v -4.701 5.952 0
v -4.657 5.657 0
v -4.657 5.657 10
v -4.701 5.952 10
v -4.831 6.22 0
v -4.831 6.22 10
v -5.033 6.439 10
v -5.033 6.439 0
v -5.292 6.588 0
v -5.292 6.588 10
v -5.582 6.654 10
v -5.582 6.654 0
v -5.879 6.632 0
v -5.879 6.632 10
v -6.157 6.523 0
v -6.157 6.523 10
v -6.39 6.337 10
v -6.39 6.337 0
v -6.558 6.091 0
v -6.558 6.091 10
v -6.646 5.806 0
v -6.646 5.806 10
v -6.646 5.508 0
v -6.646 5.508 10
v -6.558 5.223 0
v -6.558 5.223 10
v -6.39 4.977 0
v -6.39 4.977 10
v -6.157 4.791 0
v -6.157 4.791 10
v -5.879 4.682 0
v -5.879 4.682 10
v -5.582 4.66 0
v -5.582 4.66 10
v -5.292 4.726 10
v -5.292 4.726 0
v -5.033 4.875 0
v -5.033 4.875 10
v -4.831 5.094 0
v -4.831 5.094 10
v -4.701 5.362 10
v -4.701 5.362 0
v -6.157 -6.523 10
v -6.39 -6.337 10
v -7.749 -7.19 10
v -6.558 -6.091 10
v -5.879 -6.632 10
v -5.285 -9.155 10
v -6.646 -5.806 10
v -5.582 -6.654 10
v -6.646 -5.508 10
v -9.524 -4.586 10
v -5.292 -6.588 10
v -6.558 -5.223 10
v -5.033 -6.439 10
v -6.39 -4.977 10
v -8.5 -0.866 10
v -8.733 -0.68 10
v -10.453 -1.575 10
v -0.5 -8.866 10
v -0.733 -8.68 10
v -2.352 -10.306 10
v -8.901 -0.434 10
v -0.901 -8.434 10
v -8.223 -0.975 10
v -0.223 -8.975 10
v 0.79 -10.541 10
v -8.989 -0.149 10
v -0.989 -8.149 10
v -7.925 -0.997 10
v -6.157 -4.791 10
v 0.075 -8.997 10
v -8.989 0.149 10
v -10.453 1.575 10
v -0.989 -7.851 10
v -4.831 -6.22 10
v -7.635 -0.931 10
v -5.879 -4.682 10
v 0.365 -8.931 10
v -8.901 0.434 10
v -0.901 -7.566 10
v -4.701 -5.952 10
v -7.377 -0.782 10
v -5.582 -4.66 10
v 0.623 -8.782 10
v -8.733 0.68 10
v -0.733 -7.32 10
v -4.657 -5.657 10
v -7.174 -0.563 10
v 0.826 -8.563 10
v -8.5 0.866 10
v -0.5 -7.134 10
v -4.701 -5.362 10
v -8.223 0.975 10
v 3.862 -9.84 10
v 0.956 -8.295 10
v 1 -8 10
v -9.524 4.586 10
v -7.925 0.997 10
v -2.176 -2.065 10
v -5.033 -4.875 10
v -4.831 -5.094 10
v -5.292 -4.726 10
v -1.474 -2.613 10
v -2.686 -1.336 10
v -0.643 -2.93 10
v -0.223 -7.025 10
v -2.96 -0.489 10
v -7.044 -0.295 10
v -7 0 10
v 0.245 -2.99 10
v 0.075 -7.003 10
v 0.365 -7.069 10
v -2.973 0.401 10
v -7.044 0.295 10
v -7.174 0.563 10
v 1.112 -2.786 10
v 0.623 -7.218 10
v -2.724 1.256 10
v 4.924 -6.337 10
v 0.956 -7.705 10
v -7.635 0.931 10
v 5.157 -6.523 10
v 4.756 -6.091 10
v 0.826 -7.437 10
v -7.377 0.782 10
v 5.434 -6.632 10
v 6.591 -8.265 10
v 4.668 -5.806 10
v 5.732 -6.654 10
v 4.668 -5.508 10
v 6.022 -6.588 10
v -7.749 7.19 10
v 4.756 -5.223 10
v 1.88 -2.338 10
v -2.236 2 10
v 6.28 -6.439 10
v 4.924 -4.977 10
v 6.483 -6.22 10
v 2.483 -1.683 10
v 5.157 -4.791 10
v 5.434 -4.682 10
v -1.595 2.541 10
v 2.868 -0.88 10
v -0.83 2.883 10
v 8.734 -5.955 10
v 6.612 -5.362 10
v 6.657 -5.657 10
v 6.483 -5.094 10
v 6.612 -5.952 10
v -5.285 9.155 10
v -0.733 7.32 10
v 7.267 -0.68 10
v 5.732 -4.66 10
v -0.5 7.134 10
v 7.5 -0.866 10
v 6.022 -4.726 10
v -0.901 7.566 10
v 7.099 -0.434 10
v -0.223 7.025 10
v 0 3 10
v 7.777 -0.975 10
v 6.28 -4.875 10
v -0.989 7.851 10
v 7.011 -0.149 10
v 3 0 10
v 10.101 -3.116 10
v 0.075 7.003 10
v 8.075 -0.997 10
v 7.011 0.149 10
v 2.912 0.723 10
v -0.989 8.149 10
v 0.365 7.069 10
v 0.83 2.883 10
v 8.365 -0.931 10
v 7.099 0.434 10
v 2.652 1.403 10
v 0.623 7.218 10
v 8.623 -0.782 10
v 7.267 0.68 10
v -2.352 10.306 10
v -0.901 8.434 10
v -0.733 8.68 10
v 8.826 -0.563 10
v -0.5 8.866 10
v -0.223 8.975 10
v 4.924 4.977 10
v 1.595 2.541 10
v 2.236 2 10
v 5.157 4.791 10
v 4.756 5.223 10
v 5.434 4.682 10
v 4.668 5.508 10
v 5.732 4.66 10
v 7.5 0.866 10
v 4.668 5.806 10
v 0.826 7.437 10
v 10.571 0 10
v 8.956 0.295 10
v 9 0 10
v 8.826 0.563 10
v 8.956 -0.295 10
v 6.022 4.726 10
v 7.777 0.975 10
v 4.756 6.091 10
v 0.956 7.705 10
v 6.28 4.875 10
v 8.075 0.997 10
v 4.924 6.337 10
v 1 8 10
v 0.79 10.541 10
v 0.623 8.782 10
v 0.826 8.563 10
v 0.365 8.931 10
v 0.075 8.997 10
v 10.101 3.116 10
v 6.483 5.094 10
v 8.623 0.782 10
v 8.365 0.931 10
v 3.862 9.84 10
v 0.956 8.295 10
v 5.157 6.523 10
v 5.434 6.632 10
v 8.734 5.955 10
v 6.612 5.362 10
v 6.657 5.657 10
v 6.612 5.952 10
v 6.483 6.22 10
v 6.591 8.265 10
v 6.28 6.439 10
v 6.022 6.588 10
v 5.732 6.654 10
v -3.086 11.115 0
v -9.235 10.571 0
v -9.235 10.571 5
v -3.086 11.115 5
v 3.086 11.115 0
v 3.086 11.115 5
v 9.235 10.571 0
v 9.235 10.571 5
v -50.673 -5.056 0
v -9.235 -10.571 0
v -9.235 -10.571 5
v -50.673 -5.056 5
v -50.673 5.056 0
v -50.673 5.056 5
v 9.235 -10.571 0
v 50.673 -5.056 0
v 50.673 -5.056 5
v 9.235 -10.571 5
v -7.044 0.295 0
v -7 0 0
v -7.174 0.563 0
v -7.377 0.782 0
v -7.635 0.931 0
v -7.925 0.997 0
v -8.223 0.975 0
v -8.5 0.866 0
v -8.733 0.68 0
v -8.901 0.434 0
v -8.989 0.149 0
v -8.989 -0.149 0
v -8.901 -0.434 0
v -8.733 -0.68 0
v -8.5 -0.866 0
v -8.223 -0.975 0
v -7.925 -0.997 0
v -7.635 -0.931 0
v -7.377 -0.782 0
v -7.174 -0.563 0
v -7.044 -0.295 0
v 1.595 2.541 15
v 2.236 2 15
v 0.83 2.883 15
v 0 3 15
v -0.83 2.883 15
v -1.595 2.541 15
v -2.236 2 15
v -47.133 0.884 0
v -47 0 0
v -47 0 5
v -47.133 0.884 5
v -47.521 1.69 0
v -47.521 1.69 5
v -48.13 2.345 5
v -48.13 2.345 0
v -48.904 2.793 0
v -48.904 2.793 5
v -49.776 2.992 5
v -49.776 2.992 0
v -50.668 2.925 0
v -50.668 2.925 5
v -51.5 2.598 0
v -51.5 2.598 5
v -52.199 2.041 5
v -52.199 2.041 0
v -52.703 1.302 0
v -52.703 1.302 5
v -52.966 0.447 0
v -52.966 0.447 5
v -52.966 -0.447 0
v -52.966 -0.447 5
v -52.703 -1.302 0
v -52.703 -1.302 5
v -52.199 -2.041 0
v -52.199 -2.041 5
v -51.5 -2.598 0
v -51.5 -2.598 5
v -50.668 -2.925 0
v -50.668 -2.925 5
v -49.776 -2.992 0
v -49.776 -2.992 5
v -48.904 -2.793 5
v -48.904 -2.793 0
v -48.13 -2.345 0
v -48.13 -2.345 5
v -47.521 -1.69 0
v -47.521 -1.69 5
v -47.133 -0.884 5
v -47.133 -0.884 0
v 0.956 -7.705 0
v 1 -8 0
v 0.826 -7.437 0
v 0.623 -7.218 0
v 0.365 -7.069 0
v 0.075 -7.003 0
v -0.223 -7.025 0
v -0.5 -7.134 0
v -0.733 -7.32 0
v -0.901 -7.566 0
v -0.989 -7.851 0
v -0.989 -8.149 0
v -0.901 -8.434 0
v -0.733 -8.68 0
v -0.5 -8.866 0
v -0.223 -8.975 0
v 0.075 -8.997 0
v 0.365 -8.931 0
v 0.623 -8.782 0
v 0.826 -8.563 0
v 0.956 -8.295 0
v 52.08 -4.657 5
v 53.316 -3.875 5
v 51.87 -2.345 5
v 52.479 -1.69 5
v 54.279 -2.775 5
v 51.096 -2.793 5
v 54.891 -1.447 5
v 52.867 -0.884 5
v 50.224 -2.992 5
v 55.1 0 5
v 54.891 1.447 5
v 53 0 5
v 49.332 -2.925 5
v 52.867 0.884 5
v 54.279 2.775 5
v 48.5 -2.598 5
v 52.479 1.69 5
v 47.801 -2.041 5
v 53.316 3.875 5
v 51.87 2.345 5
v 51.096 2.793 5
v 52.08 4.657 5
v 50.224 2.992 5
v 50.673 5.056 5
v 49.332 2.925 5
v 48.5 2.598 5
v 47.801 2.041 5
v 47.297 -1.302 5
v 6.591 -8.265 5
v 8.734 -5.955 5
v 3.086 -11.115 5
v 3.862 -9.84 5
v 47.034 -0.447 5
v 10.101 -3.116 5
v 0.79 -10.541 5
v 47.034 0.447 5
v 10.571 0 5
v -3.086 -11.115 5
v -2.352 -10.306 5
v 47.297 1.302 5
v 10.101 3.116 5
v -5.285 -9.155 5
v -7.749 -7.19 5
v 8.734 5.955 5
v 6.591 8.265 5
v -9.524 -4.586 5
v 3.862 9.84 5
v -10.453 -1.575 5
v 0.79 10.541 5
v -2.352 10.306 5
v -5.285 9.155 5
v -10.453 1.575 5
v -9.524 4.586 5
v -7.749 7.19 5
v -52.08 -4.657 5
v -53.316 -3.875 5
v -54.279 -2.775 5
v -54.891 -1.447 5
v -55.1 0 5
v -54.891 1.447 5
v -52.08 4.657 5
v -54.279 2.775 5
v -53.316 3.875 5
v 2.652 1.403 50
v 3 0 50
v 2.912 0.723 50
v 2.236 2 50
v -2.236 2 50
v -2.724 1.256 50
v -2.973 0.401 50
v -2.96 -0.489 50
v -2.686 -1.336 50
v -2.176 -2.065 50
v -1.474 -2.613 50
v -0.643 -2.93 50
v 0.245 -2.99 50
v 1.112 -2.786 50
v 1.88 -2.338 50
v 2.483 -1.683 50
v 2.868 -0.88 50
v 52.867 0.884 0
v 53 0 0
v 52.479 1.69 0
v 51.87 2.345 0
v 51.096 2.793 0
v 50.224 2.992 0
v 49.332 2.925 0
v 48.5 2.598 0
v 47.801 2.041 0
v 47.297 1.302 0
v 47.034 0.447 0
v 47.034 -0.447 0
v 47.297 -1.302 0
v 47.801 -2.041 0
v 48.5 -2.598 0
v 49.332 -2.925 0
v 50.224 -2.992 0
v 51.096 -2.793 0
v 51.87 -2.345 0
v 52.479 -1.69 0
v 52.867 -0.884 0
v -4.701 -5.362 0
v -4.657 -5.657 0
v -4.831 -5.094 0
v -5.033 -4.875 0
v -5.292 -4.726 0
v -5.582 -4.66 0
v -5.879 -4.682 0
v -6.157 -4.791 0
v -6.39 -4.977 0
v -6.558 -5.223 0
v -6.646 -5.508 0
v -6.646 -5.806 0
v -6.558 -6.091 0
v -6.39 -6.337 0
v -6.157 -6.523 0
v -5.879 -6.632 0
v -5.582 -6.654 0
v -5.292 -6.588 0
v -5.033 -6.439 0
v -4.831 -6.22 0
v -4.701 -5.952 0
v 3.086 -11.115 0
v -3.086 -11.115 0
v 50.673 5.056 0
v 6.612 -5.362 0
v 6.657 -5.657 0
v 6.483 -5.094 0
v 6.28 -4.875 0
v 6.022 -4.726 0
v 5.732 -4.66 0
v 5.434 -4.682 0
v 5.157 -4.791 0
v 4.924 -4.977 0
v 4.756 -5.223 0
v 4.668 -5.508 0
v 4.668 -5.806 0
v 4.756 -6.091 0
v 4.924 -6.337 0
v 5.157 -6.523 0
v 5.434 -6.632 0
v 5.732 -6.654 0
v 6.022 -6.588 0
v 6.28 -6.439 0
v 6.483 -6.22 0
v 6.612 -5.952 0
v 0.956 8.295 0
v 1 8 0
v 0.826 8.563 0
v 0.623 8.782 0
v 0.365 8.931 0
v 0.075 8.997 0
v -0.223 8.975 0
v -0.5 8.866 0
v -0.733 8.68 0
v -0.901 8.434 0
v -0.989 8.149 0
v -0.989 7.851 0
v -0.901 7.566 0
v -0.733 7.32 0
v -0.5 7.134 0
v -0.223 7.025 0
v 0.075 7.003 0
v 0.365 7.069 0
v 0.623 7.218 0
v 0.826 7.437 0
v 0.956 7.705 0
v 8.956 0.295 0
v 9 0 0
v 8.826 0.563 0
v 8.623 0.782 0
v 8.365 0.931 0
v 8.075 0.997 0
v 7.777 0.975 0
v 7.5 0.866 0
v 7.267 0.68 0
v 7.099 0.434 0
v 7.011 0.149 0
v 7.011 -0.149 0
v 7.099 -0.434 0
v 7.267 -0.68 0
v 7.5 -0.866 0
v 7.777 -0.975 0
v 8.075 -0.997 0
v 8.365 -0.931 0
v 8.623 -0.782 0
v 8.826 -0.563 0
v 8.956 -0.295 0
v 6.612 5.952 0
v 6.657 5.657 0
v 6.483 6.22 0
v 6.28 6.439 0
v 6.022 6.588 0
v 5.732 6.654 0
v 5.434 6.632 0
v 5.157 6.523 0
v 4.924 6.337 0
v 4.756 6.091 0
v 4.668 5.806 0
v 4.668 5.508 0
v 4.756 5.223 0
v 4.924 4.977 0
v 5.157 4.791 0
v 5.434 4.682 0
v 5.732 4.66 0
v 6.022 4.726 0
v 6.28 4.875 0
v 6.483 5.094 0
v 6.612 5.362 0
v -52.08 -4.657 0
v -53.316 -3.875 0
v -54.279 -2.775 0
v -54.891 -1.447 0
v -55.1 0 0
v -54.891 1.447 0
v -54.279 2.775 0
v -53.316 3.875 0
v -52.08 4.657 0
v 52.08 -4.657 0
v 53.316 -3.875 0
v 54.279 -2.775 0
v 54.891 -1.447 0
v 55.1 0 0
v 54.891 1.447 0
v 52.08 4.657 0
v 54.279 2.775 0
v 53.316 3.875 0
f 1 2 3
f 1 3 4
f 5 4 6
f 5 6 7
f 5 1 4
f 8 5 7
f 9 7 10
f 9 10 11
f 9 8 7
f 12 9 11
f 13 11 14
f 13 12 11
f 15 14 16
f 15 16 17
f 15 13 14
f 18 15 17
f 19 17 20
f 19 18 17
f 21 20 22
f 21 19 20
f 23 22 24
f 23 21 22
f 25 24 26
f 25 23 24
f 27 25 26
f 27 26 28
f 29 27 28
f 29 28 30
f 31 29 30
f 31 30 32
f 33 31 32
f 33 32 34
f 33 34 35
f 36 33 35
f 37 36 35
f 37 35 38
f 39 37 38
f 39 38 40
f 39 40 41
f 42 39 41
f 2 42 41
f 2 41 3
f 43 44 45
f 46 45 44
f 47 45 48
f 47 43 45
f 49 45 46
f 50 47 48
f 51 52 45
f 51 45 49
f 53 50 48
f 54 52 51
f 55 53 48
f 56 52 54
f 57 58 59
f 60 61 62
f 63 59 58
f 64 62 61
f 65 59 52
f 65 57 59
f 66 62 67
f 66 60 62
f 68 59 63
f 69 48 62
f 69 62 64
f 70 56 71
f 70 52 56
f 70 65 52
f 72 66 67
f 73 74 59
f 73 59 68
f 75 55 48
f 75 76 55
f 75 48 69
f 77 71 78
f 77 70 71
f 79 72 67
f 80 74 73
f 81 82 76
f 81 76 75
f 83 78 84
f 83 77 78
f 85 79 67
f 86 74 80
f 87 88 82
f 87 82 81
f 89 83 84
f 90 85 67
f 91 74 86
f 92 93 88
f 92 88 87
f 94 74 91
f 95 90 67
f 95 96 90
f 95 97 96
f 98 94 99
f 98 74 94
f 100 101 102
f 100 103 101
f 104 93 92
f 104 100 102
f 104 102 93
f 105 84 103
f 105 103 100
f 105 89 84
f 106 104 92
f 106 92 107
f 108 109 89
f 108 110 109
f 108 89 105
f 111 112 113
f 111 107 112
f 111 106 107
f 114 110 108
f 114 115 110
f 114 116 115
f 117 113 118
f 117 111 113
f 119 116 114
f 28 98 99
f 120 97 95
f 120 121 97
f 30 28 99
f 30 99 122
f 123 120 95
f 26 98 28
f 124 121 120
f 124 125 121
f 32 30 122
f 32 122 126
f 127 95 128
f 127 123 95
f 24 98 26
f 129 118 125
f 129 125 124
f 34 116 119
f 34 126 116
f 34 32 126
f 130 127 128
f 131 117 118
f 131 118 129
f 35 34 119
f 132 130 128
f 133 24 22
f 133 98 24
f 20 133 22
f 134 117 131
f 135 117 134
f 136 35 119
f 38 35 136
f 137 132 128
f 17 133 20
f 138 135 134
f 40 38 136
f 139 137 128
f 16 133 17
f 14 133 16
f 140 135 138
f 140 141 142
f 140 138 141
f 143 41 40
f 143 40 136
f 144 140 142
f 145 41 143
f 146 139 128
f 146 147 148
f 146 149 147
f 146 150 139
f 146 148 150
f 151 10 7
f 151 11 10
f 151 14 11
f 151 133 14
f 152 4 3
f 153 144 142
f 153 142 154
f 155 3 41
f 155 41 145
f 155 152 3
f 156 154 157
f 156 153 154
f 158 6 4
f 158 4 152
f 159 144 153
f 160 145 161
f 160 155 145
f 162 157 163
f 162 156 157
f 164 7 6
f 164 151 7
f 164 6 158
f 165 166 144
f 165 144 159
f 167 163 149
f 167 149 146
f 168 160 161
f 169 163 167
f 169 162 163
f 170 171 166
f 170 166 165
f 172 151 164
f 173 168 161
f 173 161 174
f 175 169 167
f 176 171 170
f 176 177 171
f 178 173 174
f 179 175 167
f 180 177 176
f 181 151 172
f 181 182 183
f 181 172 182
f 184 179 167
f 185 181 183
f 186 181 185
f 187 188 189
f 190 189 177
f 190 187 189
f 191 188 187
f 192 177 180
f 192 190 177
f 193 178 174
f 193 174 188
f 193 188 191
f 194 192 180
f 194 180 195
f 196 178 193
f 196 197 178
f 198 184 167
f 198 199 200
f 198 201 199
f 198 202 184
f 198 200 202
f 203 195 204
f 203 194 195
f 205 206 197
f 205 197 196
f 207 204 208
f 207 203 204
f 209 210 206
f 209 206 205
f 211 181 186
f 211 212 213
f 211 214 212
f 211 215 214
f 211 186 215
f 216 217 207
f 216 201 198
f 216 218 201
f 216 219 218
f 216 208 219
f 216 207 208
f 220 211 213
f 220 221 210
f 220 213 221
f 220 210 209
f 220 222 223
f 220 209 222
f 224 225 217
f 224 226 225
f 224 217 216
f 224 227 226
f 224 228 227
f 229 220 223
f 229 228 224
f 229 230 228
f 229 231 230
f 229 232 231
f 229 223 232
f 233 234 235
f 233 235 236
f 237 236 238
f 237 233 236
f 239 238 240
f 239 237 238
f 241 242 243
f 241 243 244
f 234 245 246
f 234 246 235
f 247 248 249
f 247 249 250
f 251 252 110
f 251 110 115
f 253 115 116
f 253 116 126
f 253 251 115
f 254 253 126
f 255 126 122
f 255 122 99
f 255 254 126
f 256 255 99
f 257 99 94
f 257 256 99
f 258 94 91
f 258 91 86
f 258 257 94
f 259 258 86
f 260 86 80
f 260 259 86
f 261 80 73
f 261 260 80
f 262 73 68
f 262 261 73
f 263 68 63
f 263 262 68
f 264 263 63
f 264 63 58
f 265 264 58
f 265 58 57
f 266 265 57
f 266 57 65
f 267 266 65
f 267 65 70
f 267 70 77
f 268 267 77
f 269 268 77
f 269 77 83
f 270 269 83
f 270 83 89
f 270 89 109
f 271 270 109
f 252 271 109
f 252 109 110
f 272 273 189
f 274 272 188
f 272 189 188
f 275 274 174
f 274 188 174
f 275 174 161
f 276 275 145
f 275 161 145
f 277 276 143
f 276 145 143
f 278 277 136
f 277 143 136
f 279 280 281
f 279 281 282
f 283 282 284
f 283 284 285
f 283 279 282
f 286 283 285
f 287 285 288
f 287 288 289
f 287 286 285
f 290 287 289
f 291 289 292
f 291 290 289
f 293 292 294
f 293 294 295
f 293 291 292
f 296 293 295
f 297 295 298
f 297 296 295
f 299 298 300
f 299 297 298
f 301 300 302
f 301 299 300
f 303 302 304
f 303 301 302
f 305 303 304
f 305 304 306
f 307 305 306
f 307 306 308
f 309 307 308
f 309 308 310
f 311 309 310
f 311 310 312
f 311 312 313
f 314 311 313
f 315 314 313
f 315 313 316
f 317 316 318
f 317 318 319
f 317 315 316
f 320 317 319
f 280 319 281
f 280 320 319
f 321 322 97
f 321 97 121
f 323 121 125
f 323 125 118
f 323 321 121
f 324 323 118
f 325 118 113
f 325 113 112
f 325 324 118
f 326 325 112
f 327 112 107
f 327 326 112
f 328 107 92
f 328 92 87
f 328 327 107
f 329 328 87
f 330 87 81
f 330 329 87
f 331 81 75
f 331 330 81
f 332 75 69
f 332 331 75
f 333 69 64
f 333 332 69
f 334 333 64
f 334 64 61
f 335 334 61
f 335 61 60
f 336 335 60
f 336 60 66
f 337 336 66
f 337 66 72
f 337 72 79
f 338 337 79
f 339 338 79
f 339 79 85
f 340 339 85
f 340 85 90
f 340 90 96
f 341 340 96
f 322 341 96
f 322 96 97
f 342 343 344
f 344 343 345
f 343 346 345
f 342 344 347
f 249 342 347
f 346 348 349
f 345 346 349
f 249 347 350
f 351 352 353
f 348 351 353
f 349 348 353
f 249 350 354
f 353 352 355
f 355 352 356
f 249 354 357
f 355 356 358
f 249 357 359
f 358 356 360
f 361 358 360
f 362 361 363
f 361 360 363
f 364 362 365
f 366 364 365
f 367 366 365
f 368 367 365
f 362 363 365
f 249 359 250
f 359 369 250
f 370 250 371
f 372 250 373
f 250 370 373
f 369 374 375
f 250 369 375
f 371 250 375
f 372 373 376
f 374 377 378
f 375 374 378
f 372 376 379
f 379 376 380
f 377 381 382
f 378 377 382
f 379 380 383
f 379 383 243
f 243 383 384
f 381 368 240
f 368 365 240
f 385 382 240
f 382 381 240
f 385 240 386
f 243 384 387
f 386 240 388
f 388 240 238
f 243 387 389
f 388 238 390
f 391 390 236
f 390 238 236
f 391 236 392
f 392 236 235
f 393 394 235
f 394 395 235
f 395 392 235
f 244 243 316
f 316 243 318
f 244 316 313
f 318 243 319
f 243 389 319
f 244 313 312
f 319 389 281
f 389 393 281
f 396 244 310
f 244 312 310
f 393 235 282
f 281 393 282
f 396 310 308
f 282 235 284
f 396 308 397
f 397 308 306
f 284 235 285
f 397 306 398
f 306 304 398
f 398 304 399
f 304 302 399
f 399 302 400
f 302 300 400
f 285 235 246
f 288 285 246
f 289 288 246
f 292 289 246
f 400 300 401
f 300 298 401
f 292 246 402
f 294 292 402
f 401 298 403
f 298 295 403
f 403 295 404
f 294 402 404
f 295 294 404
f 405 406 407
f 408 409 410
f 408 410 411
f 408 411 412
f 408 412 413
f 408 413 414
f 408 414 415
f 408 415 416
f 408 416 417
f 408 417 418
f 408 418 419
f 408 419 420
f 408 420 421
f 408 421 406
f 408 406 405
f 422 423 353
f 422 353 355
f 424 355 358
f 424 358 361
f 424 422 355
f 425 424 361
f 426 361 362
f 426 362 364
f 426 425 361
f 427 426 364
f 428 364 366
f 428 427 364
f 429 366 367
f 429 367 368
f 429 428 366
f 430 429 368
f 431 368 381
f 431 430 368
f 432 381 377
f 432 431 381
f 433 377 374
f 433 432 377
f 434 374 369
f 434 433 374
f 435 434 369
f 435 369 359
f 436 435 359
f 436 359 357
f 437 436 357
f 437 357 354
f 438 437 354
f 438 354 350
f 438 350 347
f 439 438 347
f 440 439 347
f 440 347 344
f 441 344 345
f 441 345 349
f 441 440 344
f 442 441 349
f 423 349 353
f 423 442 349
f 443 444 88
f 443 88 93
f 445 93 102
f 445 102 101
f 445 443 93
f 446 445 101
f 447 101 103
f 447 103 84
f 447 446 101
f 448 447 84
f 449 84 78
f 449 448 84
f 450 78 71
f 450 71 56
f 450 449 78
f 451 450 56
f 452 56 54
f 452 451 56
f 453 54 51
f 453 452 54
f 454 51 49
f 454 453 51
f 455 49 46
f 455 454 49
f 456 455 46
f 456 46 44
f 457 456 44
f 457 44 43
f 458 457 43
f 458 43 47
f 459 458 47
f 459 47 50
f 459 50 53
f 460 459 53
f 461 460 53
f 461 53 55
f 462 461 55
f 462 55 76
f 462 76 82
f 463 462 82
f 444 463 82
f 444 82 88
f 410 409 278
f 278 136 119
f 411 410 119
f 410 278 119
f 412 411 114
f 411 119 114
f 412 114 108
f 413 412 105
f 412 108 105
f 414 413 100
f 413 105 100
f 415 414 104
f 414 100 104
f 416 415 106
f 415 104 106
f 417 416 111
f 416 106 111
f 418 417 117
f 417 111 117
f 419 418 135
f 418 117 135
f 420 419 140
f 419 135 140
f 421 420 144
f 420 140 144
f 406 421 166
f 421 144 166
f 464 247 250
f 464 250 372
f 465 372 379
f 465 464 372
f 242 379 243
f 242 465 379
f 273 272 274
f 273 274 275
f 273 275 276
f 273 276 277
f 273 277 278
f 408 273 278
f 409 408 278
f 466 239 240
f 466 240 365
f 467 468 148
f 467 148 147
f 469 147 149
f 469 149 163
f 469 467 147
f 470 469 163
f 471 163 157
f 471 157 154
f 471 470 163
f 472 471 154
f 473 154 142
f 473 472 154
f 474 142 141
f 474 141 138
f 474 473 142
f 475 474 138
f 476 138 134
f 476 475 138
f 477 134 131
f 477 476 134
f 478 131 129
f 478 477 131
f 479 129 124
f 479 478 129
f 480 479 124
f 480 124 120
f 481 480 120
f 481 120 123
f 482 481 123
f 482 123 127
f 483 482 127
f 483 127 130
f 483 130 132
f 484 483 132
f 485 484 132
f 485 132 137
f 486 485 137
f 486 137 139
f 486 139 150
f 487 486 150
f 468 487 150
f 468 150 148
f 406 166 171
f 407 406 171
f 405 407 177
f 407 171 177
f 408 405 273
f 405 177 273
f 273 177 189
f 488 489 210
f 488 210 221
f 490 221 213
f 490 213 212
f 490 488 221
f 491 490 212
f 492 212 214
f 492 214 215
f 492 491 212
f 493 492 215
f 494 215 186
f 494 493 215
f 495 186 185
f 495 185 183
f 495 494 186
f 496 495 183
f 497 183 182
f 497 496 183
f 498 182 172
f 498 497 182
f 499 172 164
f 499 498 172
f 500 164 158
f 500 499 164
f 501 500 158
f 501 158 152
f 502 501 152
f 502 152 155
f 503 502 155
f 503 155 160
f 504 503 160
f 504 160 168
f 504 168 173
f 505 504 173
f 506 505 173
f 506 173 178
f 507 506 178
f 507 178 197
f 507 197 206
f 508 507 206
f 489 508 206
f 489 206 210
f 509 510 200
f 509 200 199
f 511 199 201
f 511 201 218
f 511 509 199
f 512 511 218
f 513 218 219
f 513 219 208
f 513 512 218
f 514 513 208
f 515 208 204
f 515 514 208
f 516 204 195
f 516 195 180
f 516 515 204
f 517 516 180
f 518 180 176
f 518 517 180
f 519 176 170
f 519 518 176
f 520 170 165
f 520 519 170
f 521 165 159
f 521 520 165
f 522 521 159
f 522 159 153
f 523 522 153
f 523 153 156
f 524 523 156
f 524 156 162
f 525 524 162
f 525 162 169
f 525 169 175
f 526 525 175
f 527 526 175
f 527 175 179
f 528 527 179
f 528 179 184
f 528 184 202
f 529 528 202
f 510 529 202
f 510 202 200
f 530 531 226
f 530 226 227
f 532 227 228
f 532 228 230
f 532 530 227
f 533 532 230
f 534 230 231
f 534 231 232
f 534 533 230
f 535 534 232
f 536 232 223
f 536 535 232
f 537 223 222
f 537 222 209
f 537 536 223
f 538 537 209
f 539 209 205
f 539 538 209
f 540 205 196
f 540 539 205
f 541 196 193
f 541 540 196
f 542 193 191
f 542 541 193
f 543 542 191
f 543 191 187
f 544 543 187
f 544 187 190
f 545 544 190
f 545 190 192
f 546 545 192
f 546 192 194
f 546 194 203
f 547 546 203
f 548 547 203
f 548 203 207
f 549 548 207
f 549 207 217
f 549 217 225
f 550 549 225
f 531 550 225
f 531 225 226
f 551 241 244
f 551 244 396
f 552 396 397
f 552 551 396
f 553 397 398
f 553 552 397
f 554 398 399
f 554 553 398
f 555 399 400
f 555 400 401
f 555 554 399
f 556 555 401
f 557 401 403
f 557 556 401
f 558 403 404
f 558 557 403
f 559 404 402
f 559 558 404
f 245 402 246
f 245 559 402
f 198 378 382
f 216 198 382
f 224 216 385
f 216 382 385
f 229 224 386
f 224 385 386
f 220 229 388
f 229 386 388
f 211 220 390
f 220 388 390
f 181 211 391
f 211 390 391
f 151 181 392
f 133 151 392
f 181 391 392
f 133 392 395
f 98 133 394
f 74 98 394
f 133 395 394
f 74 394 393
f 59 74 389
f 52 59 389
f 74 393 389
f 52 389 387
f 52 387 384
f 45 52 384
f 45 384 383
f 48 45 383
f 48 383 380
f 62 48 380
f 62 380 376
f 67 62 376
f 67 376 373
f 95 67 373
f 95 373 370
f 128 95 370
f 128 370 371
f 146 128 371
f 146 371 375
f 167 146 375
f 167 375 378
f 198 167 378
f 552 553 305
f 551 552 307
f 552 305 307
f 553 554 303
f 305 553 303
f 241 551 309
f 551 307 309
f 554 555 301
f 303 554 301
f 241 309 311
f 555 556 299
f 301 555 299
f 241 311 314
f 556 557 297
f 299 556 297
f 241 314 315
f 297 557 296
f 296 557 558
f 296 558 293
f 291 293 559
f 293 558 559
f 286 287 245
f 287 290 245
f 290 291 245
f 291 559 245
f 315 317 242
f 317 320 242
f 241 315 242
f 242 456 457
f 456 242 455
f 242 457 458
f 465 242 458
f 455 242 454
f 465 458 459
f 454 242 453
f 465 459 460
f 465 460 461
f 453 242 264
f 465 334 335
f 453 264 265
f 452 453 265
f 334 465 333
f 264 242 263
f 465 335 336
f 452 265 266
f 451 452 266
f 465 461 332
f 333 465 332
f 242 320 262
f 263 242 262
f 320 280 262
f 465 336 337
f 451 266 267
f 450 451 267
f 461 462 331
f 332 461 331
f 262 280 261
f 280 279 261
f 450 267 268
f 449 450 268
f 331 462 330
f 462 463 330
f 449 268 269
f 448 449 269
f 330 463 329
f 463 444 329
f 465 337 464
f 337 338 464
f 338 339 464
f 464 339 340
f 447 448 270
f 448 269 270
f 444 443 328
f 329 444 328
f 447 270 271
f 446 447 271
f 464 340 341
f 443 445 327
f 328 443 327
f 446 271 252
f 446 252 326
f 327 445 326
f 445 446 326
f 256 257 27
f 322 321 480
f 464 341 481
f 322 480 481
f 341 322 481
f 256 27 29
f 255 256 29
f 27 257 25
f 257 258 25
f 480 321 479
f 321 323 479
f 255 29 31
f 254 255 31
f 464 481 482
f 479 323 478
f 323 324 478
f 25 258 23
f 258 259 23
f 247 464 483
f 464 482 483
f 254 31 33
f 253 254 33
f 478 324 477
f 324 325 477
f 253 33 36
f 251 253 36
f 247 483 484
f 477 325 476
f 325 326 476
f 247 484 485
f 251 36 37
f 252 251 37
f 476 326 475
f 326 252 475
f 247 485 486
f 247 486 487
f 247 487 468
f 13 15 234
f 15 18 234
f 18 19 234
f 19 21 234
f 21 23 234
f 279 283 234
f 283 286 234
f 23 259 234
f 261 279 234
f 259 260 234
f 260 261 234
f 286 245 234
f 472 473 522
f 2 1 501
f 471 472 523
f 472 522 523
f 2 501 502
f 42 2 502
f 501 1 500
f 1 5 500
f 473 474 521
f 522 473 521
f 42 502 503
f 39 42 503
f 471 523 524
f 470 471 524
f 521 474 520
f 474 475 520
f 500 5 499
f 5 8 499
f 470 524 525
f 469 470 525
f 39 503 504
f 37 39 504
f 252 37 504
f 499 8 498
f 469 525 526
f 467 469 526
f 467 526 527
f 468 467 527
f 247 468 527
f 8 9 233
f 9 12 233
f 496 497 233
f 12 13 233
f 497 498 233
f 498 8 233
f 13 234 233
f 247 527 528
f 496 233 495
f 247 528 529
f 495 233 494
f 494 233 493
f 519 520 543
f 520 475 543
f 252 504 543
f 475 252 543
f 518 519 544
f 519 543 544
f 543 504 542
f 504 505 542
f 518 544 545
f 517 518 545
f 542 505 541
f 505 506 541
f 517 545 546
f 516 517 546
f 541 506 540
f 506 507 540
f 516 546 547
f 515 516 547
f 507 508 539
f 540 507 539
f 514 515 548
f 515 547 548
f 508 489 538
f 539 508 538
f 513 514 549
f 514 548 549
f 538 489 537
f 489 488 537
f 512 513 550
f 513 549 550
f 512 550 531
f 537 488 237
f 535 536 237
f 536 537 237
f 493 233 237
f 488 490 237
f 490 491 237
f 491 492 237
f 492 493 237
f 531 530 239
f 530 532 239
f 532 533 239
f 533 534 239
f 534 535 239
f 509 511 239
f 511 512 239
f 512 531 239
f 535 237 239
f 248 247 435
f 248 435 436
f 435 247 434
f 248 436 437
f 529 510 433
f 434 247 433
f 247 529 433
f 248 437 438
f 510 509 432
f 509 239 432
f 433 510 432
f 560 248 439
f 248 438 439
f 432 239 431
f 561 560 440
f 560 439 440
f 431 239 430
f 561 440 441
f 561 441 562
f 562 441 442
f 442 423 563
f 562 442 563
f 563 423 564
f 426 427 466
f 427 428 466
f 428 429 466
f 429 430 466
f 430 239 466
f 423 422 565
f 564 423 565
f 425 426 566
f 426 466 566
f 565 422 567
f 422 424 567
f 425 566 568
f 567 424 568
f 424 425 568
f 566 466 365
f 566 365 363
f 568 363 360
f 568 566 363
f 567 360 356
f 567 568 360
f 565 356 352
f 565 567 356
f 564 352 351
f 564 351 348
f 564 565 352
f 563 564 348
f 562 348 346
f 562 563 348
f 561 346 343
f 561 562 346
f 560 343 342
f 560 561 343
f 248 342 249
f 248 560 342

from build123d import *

# Parameters (mm, degrees)
SZKIC1_R                    = 3
SZKIC1_R_2                  = 1
DODANIE_WYCI_GNI_CIE1_DEPTH = 5
SZKIC1_3_R                  = 10.570763761
SZKIC1_3_R_2                = 1
DODANIE_WYCI_GNI_CIE2_DEPTH = 10
DODANIE_WYCI_GNI_CIE3_DEPTH = 50
SZKIC1_5_R                  = 3
DODANIE_WYCI_GNI_CIE4_DEPTH = 15


with BuildPart() as part:
    # Szkic1 → Dodanie-wyci_gni_cie1 (new body)
    with BuildSketch(Plane.XY):
        with BuildLine():
            Line((-9.235111676, 10.570763761), (-50.67287635, 5.055665151))
            ThreePointArc((-50.67287635, 5.055665151), (-55.100246338, 0), (-50.67287635, -5.055665151))
            Line((-50.67287635, -5.055665151), (-9.235111676, -10.570763761))
            ThreePointArc((-9.235111676, -10.570763761), (0, -11.182632843), (9.235111676, -10.570763761))
            Line((9.235111676, -10.570763761), (50.67287635, -5.055665151))
            ThreePointArc((50.67287635, -5.055665151), (55.100246338, 0), (50.67287635, 5.055665151))
            Line((50.67287635, 5.055665151), (9.235111676, 10.570763761))
            ThreePointArc((9.235111676, 10.570763761), (0, 11.182632843), (-9.235111676, 10.570763761))
        make_face()
        with Locations((-50, 0)):
            Circle(SZKIC1_R, mode=Mode.SUBTRACT)
        with Locations((50, 0)):
            Circle(SZKIC1_R, mode=Mode.SUBTRACT)
        with Locations((0, 8)):
            Circle(SZKIC1_R_2, mode=Mode.SUBTRACT)
        with Locations((0, -8)):
            Circle(SZKIC1_R_2, mode=Mode.SUBTRACT)
        with Locations((-5.656854249, -5.656854249)):
            Circle(SZKIC1_R_2, mode=Mode.SUBTRACT)
        with Locations((-8, 0)):
            Circle(SZKIC1_R_2, mode=Mode.SUBTRACT)
        with Locations((5.656854249, -5.656854249)):
            Circle(SZKIC1_R_2, mode=Mode.SUBTRACT)
        with Locations((8, 0)):
            Circle(SZKIC1_R_2, mode=Mode.SUBTRACT)
        with Locations((-5.656854249, 5.656854249)):
            Circle(SZKIC1_R_2, mode=Mode.SUBTRACT)
        with Locations((5.656854249, 5.656854249)):
            Circle(SZKIC1_R_2, mode=Mode.SUBTRACT)
    extrude(amount=DODANIE_WYCI_GNI_CIE1_DEPTH)

    # Szkic1_3 → Dodanie-wyci_gni_cie2 (add)
    with BuildSketch(Plane.XY):
        Circle(SZKIC1_3_R)
        with Locations((0, -8)):
            Circle(SZKIC1_3_R_2, mode=Mode.SUBTRACT)
        with Locations((-5.656854249, -5.656854249)):
            Circle(SZKIC1_3_R_2, mode=Mode.SUBTRACT)
        with Locations((-8, 0)):
            Circle(SZKIC1_3_R_2, mode=Mode.SUBTRACT)
        with BuildLine():
            ThreePointArc((-2.236067977, 2), (0, 3), (2.236067977, 2))
            ThreePointArc((2.236067977, 2), (2.802517077, 1.070466269), (3, 0))
            ThreePointArc((3, 0), (-1.070466269, -2.802517077), (-2.236067977, 2))
        make_face(mode=Mode.SUBTRACT)
        with Locations((5.656854249, -5.656854249)):
            Circle(SZKIC1_3_R_2, mode=Mode.SUBTRACT)
        with Locations((8, 0)):
            Circle(SZKIC1_3_R_2, mode=Mode.SUBTRACT)
        with Locations((-5.656854249, 5.656854249)):
            Circle(SZKIC1_3_R_2, mode=Mode.SUBTRACT)
        with Locations((5.656854249, 5.656854249)):
            Circle(SZKIC1_3_R_2, mode=Mode.SUBTRACT)
        with Locations((0, 8)):
            Circle(SZKIC1_3_R_2, mode=Mode.SUBTRACT)
    extrude(amount=DODANIE_WYCI_GNI_CIE2_DEPTH)

    # Szkic1_4 → Dodanie-wyci_gni_cie3 (add)
    with BuildSketch(Plane.XY):
        with BuildLine():
            ThreePointArc((3, 0), (2.802517077, 1.070466269), (2.236067977, 2))
            Line((2.236067977, 2), (-2.236067977, 2))
            ThreePointArc((-2.236067977, 2), (-1.070466269, -2.802517077), (3, 0))
        make_face()
    extrude(amount=DODANIE_WYCI_GNI_CIE3_DEPTH)

    # Szkic1_5 → Dodanie-wyci_gni_cie4 (add)
    with BuildSketch(Plane.XY):
        Circle(SZKIC1_5_R)
    extrude(amount=DODANIE_WYCI_GNI_CIE4_DEPTH)


solid = part.part
